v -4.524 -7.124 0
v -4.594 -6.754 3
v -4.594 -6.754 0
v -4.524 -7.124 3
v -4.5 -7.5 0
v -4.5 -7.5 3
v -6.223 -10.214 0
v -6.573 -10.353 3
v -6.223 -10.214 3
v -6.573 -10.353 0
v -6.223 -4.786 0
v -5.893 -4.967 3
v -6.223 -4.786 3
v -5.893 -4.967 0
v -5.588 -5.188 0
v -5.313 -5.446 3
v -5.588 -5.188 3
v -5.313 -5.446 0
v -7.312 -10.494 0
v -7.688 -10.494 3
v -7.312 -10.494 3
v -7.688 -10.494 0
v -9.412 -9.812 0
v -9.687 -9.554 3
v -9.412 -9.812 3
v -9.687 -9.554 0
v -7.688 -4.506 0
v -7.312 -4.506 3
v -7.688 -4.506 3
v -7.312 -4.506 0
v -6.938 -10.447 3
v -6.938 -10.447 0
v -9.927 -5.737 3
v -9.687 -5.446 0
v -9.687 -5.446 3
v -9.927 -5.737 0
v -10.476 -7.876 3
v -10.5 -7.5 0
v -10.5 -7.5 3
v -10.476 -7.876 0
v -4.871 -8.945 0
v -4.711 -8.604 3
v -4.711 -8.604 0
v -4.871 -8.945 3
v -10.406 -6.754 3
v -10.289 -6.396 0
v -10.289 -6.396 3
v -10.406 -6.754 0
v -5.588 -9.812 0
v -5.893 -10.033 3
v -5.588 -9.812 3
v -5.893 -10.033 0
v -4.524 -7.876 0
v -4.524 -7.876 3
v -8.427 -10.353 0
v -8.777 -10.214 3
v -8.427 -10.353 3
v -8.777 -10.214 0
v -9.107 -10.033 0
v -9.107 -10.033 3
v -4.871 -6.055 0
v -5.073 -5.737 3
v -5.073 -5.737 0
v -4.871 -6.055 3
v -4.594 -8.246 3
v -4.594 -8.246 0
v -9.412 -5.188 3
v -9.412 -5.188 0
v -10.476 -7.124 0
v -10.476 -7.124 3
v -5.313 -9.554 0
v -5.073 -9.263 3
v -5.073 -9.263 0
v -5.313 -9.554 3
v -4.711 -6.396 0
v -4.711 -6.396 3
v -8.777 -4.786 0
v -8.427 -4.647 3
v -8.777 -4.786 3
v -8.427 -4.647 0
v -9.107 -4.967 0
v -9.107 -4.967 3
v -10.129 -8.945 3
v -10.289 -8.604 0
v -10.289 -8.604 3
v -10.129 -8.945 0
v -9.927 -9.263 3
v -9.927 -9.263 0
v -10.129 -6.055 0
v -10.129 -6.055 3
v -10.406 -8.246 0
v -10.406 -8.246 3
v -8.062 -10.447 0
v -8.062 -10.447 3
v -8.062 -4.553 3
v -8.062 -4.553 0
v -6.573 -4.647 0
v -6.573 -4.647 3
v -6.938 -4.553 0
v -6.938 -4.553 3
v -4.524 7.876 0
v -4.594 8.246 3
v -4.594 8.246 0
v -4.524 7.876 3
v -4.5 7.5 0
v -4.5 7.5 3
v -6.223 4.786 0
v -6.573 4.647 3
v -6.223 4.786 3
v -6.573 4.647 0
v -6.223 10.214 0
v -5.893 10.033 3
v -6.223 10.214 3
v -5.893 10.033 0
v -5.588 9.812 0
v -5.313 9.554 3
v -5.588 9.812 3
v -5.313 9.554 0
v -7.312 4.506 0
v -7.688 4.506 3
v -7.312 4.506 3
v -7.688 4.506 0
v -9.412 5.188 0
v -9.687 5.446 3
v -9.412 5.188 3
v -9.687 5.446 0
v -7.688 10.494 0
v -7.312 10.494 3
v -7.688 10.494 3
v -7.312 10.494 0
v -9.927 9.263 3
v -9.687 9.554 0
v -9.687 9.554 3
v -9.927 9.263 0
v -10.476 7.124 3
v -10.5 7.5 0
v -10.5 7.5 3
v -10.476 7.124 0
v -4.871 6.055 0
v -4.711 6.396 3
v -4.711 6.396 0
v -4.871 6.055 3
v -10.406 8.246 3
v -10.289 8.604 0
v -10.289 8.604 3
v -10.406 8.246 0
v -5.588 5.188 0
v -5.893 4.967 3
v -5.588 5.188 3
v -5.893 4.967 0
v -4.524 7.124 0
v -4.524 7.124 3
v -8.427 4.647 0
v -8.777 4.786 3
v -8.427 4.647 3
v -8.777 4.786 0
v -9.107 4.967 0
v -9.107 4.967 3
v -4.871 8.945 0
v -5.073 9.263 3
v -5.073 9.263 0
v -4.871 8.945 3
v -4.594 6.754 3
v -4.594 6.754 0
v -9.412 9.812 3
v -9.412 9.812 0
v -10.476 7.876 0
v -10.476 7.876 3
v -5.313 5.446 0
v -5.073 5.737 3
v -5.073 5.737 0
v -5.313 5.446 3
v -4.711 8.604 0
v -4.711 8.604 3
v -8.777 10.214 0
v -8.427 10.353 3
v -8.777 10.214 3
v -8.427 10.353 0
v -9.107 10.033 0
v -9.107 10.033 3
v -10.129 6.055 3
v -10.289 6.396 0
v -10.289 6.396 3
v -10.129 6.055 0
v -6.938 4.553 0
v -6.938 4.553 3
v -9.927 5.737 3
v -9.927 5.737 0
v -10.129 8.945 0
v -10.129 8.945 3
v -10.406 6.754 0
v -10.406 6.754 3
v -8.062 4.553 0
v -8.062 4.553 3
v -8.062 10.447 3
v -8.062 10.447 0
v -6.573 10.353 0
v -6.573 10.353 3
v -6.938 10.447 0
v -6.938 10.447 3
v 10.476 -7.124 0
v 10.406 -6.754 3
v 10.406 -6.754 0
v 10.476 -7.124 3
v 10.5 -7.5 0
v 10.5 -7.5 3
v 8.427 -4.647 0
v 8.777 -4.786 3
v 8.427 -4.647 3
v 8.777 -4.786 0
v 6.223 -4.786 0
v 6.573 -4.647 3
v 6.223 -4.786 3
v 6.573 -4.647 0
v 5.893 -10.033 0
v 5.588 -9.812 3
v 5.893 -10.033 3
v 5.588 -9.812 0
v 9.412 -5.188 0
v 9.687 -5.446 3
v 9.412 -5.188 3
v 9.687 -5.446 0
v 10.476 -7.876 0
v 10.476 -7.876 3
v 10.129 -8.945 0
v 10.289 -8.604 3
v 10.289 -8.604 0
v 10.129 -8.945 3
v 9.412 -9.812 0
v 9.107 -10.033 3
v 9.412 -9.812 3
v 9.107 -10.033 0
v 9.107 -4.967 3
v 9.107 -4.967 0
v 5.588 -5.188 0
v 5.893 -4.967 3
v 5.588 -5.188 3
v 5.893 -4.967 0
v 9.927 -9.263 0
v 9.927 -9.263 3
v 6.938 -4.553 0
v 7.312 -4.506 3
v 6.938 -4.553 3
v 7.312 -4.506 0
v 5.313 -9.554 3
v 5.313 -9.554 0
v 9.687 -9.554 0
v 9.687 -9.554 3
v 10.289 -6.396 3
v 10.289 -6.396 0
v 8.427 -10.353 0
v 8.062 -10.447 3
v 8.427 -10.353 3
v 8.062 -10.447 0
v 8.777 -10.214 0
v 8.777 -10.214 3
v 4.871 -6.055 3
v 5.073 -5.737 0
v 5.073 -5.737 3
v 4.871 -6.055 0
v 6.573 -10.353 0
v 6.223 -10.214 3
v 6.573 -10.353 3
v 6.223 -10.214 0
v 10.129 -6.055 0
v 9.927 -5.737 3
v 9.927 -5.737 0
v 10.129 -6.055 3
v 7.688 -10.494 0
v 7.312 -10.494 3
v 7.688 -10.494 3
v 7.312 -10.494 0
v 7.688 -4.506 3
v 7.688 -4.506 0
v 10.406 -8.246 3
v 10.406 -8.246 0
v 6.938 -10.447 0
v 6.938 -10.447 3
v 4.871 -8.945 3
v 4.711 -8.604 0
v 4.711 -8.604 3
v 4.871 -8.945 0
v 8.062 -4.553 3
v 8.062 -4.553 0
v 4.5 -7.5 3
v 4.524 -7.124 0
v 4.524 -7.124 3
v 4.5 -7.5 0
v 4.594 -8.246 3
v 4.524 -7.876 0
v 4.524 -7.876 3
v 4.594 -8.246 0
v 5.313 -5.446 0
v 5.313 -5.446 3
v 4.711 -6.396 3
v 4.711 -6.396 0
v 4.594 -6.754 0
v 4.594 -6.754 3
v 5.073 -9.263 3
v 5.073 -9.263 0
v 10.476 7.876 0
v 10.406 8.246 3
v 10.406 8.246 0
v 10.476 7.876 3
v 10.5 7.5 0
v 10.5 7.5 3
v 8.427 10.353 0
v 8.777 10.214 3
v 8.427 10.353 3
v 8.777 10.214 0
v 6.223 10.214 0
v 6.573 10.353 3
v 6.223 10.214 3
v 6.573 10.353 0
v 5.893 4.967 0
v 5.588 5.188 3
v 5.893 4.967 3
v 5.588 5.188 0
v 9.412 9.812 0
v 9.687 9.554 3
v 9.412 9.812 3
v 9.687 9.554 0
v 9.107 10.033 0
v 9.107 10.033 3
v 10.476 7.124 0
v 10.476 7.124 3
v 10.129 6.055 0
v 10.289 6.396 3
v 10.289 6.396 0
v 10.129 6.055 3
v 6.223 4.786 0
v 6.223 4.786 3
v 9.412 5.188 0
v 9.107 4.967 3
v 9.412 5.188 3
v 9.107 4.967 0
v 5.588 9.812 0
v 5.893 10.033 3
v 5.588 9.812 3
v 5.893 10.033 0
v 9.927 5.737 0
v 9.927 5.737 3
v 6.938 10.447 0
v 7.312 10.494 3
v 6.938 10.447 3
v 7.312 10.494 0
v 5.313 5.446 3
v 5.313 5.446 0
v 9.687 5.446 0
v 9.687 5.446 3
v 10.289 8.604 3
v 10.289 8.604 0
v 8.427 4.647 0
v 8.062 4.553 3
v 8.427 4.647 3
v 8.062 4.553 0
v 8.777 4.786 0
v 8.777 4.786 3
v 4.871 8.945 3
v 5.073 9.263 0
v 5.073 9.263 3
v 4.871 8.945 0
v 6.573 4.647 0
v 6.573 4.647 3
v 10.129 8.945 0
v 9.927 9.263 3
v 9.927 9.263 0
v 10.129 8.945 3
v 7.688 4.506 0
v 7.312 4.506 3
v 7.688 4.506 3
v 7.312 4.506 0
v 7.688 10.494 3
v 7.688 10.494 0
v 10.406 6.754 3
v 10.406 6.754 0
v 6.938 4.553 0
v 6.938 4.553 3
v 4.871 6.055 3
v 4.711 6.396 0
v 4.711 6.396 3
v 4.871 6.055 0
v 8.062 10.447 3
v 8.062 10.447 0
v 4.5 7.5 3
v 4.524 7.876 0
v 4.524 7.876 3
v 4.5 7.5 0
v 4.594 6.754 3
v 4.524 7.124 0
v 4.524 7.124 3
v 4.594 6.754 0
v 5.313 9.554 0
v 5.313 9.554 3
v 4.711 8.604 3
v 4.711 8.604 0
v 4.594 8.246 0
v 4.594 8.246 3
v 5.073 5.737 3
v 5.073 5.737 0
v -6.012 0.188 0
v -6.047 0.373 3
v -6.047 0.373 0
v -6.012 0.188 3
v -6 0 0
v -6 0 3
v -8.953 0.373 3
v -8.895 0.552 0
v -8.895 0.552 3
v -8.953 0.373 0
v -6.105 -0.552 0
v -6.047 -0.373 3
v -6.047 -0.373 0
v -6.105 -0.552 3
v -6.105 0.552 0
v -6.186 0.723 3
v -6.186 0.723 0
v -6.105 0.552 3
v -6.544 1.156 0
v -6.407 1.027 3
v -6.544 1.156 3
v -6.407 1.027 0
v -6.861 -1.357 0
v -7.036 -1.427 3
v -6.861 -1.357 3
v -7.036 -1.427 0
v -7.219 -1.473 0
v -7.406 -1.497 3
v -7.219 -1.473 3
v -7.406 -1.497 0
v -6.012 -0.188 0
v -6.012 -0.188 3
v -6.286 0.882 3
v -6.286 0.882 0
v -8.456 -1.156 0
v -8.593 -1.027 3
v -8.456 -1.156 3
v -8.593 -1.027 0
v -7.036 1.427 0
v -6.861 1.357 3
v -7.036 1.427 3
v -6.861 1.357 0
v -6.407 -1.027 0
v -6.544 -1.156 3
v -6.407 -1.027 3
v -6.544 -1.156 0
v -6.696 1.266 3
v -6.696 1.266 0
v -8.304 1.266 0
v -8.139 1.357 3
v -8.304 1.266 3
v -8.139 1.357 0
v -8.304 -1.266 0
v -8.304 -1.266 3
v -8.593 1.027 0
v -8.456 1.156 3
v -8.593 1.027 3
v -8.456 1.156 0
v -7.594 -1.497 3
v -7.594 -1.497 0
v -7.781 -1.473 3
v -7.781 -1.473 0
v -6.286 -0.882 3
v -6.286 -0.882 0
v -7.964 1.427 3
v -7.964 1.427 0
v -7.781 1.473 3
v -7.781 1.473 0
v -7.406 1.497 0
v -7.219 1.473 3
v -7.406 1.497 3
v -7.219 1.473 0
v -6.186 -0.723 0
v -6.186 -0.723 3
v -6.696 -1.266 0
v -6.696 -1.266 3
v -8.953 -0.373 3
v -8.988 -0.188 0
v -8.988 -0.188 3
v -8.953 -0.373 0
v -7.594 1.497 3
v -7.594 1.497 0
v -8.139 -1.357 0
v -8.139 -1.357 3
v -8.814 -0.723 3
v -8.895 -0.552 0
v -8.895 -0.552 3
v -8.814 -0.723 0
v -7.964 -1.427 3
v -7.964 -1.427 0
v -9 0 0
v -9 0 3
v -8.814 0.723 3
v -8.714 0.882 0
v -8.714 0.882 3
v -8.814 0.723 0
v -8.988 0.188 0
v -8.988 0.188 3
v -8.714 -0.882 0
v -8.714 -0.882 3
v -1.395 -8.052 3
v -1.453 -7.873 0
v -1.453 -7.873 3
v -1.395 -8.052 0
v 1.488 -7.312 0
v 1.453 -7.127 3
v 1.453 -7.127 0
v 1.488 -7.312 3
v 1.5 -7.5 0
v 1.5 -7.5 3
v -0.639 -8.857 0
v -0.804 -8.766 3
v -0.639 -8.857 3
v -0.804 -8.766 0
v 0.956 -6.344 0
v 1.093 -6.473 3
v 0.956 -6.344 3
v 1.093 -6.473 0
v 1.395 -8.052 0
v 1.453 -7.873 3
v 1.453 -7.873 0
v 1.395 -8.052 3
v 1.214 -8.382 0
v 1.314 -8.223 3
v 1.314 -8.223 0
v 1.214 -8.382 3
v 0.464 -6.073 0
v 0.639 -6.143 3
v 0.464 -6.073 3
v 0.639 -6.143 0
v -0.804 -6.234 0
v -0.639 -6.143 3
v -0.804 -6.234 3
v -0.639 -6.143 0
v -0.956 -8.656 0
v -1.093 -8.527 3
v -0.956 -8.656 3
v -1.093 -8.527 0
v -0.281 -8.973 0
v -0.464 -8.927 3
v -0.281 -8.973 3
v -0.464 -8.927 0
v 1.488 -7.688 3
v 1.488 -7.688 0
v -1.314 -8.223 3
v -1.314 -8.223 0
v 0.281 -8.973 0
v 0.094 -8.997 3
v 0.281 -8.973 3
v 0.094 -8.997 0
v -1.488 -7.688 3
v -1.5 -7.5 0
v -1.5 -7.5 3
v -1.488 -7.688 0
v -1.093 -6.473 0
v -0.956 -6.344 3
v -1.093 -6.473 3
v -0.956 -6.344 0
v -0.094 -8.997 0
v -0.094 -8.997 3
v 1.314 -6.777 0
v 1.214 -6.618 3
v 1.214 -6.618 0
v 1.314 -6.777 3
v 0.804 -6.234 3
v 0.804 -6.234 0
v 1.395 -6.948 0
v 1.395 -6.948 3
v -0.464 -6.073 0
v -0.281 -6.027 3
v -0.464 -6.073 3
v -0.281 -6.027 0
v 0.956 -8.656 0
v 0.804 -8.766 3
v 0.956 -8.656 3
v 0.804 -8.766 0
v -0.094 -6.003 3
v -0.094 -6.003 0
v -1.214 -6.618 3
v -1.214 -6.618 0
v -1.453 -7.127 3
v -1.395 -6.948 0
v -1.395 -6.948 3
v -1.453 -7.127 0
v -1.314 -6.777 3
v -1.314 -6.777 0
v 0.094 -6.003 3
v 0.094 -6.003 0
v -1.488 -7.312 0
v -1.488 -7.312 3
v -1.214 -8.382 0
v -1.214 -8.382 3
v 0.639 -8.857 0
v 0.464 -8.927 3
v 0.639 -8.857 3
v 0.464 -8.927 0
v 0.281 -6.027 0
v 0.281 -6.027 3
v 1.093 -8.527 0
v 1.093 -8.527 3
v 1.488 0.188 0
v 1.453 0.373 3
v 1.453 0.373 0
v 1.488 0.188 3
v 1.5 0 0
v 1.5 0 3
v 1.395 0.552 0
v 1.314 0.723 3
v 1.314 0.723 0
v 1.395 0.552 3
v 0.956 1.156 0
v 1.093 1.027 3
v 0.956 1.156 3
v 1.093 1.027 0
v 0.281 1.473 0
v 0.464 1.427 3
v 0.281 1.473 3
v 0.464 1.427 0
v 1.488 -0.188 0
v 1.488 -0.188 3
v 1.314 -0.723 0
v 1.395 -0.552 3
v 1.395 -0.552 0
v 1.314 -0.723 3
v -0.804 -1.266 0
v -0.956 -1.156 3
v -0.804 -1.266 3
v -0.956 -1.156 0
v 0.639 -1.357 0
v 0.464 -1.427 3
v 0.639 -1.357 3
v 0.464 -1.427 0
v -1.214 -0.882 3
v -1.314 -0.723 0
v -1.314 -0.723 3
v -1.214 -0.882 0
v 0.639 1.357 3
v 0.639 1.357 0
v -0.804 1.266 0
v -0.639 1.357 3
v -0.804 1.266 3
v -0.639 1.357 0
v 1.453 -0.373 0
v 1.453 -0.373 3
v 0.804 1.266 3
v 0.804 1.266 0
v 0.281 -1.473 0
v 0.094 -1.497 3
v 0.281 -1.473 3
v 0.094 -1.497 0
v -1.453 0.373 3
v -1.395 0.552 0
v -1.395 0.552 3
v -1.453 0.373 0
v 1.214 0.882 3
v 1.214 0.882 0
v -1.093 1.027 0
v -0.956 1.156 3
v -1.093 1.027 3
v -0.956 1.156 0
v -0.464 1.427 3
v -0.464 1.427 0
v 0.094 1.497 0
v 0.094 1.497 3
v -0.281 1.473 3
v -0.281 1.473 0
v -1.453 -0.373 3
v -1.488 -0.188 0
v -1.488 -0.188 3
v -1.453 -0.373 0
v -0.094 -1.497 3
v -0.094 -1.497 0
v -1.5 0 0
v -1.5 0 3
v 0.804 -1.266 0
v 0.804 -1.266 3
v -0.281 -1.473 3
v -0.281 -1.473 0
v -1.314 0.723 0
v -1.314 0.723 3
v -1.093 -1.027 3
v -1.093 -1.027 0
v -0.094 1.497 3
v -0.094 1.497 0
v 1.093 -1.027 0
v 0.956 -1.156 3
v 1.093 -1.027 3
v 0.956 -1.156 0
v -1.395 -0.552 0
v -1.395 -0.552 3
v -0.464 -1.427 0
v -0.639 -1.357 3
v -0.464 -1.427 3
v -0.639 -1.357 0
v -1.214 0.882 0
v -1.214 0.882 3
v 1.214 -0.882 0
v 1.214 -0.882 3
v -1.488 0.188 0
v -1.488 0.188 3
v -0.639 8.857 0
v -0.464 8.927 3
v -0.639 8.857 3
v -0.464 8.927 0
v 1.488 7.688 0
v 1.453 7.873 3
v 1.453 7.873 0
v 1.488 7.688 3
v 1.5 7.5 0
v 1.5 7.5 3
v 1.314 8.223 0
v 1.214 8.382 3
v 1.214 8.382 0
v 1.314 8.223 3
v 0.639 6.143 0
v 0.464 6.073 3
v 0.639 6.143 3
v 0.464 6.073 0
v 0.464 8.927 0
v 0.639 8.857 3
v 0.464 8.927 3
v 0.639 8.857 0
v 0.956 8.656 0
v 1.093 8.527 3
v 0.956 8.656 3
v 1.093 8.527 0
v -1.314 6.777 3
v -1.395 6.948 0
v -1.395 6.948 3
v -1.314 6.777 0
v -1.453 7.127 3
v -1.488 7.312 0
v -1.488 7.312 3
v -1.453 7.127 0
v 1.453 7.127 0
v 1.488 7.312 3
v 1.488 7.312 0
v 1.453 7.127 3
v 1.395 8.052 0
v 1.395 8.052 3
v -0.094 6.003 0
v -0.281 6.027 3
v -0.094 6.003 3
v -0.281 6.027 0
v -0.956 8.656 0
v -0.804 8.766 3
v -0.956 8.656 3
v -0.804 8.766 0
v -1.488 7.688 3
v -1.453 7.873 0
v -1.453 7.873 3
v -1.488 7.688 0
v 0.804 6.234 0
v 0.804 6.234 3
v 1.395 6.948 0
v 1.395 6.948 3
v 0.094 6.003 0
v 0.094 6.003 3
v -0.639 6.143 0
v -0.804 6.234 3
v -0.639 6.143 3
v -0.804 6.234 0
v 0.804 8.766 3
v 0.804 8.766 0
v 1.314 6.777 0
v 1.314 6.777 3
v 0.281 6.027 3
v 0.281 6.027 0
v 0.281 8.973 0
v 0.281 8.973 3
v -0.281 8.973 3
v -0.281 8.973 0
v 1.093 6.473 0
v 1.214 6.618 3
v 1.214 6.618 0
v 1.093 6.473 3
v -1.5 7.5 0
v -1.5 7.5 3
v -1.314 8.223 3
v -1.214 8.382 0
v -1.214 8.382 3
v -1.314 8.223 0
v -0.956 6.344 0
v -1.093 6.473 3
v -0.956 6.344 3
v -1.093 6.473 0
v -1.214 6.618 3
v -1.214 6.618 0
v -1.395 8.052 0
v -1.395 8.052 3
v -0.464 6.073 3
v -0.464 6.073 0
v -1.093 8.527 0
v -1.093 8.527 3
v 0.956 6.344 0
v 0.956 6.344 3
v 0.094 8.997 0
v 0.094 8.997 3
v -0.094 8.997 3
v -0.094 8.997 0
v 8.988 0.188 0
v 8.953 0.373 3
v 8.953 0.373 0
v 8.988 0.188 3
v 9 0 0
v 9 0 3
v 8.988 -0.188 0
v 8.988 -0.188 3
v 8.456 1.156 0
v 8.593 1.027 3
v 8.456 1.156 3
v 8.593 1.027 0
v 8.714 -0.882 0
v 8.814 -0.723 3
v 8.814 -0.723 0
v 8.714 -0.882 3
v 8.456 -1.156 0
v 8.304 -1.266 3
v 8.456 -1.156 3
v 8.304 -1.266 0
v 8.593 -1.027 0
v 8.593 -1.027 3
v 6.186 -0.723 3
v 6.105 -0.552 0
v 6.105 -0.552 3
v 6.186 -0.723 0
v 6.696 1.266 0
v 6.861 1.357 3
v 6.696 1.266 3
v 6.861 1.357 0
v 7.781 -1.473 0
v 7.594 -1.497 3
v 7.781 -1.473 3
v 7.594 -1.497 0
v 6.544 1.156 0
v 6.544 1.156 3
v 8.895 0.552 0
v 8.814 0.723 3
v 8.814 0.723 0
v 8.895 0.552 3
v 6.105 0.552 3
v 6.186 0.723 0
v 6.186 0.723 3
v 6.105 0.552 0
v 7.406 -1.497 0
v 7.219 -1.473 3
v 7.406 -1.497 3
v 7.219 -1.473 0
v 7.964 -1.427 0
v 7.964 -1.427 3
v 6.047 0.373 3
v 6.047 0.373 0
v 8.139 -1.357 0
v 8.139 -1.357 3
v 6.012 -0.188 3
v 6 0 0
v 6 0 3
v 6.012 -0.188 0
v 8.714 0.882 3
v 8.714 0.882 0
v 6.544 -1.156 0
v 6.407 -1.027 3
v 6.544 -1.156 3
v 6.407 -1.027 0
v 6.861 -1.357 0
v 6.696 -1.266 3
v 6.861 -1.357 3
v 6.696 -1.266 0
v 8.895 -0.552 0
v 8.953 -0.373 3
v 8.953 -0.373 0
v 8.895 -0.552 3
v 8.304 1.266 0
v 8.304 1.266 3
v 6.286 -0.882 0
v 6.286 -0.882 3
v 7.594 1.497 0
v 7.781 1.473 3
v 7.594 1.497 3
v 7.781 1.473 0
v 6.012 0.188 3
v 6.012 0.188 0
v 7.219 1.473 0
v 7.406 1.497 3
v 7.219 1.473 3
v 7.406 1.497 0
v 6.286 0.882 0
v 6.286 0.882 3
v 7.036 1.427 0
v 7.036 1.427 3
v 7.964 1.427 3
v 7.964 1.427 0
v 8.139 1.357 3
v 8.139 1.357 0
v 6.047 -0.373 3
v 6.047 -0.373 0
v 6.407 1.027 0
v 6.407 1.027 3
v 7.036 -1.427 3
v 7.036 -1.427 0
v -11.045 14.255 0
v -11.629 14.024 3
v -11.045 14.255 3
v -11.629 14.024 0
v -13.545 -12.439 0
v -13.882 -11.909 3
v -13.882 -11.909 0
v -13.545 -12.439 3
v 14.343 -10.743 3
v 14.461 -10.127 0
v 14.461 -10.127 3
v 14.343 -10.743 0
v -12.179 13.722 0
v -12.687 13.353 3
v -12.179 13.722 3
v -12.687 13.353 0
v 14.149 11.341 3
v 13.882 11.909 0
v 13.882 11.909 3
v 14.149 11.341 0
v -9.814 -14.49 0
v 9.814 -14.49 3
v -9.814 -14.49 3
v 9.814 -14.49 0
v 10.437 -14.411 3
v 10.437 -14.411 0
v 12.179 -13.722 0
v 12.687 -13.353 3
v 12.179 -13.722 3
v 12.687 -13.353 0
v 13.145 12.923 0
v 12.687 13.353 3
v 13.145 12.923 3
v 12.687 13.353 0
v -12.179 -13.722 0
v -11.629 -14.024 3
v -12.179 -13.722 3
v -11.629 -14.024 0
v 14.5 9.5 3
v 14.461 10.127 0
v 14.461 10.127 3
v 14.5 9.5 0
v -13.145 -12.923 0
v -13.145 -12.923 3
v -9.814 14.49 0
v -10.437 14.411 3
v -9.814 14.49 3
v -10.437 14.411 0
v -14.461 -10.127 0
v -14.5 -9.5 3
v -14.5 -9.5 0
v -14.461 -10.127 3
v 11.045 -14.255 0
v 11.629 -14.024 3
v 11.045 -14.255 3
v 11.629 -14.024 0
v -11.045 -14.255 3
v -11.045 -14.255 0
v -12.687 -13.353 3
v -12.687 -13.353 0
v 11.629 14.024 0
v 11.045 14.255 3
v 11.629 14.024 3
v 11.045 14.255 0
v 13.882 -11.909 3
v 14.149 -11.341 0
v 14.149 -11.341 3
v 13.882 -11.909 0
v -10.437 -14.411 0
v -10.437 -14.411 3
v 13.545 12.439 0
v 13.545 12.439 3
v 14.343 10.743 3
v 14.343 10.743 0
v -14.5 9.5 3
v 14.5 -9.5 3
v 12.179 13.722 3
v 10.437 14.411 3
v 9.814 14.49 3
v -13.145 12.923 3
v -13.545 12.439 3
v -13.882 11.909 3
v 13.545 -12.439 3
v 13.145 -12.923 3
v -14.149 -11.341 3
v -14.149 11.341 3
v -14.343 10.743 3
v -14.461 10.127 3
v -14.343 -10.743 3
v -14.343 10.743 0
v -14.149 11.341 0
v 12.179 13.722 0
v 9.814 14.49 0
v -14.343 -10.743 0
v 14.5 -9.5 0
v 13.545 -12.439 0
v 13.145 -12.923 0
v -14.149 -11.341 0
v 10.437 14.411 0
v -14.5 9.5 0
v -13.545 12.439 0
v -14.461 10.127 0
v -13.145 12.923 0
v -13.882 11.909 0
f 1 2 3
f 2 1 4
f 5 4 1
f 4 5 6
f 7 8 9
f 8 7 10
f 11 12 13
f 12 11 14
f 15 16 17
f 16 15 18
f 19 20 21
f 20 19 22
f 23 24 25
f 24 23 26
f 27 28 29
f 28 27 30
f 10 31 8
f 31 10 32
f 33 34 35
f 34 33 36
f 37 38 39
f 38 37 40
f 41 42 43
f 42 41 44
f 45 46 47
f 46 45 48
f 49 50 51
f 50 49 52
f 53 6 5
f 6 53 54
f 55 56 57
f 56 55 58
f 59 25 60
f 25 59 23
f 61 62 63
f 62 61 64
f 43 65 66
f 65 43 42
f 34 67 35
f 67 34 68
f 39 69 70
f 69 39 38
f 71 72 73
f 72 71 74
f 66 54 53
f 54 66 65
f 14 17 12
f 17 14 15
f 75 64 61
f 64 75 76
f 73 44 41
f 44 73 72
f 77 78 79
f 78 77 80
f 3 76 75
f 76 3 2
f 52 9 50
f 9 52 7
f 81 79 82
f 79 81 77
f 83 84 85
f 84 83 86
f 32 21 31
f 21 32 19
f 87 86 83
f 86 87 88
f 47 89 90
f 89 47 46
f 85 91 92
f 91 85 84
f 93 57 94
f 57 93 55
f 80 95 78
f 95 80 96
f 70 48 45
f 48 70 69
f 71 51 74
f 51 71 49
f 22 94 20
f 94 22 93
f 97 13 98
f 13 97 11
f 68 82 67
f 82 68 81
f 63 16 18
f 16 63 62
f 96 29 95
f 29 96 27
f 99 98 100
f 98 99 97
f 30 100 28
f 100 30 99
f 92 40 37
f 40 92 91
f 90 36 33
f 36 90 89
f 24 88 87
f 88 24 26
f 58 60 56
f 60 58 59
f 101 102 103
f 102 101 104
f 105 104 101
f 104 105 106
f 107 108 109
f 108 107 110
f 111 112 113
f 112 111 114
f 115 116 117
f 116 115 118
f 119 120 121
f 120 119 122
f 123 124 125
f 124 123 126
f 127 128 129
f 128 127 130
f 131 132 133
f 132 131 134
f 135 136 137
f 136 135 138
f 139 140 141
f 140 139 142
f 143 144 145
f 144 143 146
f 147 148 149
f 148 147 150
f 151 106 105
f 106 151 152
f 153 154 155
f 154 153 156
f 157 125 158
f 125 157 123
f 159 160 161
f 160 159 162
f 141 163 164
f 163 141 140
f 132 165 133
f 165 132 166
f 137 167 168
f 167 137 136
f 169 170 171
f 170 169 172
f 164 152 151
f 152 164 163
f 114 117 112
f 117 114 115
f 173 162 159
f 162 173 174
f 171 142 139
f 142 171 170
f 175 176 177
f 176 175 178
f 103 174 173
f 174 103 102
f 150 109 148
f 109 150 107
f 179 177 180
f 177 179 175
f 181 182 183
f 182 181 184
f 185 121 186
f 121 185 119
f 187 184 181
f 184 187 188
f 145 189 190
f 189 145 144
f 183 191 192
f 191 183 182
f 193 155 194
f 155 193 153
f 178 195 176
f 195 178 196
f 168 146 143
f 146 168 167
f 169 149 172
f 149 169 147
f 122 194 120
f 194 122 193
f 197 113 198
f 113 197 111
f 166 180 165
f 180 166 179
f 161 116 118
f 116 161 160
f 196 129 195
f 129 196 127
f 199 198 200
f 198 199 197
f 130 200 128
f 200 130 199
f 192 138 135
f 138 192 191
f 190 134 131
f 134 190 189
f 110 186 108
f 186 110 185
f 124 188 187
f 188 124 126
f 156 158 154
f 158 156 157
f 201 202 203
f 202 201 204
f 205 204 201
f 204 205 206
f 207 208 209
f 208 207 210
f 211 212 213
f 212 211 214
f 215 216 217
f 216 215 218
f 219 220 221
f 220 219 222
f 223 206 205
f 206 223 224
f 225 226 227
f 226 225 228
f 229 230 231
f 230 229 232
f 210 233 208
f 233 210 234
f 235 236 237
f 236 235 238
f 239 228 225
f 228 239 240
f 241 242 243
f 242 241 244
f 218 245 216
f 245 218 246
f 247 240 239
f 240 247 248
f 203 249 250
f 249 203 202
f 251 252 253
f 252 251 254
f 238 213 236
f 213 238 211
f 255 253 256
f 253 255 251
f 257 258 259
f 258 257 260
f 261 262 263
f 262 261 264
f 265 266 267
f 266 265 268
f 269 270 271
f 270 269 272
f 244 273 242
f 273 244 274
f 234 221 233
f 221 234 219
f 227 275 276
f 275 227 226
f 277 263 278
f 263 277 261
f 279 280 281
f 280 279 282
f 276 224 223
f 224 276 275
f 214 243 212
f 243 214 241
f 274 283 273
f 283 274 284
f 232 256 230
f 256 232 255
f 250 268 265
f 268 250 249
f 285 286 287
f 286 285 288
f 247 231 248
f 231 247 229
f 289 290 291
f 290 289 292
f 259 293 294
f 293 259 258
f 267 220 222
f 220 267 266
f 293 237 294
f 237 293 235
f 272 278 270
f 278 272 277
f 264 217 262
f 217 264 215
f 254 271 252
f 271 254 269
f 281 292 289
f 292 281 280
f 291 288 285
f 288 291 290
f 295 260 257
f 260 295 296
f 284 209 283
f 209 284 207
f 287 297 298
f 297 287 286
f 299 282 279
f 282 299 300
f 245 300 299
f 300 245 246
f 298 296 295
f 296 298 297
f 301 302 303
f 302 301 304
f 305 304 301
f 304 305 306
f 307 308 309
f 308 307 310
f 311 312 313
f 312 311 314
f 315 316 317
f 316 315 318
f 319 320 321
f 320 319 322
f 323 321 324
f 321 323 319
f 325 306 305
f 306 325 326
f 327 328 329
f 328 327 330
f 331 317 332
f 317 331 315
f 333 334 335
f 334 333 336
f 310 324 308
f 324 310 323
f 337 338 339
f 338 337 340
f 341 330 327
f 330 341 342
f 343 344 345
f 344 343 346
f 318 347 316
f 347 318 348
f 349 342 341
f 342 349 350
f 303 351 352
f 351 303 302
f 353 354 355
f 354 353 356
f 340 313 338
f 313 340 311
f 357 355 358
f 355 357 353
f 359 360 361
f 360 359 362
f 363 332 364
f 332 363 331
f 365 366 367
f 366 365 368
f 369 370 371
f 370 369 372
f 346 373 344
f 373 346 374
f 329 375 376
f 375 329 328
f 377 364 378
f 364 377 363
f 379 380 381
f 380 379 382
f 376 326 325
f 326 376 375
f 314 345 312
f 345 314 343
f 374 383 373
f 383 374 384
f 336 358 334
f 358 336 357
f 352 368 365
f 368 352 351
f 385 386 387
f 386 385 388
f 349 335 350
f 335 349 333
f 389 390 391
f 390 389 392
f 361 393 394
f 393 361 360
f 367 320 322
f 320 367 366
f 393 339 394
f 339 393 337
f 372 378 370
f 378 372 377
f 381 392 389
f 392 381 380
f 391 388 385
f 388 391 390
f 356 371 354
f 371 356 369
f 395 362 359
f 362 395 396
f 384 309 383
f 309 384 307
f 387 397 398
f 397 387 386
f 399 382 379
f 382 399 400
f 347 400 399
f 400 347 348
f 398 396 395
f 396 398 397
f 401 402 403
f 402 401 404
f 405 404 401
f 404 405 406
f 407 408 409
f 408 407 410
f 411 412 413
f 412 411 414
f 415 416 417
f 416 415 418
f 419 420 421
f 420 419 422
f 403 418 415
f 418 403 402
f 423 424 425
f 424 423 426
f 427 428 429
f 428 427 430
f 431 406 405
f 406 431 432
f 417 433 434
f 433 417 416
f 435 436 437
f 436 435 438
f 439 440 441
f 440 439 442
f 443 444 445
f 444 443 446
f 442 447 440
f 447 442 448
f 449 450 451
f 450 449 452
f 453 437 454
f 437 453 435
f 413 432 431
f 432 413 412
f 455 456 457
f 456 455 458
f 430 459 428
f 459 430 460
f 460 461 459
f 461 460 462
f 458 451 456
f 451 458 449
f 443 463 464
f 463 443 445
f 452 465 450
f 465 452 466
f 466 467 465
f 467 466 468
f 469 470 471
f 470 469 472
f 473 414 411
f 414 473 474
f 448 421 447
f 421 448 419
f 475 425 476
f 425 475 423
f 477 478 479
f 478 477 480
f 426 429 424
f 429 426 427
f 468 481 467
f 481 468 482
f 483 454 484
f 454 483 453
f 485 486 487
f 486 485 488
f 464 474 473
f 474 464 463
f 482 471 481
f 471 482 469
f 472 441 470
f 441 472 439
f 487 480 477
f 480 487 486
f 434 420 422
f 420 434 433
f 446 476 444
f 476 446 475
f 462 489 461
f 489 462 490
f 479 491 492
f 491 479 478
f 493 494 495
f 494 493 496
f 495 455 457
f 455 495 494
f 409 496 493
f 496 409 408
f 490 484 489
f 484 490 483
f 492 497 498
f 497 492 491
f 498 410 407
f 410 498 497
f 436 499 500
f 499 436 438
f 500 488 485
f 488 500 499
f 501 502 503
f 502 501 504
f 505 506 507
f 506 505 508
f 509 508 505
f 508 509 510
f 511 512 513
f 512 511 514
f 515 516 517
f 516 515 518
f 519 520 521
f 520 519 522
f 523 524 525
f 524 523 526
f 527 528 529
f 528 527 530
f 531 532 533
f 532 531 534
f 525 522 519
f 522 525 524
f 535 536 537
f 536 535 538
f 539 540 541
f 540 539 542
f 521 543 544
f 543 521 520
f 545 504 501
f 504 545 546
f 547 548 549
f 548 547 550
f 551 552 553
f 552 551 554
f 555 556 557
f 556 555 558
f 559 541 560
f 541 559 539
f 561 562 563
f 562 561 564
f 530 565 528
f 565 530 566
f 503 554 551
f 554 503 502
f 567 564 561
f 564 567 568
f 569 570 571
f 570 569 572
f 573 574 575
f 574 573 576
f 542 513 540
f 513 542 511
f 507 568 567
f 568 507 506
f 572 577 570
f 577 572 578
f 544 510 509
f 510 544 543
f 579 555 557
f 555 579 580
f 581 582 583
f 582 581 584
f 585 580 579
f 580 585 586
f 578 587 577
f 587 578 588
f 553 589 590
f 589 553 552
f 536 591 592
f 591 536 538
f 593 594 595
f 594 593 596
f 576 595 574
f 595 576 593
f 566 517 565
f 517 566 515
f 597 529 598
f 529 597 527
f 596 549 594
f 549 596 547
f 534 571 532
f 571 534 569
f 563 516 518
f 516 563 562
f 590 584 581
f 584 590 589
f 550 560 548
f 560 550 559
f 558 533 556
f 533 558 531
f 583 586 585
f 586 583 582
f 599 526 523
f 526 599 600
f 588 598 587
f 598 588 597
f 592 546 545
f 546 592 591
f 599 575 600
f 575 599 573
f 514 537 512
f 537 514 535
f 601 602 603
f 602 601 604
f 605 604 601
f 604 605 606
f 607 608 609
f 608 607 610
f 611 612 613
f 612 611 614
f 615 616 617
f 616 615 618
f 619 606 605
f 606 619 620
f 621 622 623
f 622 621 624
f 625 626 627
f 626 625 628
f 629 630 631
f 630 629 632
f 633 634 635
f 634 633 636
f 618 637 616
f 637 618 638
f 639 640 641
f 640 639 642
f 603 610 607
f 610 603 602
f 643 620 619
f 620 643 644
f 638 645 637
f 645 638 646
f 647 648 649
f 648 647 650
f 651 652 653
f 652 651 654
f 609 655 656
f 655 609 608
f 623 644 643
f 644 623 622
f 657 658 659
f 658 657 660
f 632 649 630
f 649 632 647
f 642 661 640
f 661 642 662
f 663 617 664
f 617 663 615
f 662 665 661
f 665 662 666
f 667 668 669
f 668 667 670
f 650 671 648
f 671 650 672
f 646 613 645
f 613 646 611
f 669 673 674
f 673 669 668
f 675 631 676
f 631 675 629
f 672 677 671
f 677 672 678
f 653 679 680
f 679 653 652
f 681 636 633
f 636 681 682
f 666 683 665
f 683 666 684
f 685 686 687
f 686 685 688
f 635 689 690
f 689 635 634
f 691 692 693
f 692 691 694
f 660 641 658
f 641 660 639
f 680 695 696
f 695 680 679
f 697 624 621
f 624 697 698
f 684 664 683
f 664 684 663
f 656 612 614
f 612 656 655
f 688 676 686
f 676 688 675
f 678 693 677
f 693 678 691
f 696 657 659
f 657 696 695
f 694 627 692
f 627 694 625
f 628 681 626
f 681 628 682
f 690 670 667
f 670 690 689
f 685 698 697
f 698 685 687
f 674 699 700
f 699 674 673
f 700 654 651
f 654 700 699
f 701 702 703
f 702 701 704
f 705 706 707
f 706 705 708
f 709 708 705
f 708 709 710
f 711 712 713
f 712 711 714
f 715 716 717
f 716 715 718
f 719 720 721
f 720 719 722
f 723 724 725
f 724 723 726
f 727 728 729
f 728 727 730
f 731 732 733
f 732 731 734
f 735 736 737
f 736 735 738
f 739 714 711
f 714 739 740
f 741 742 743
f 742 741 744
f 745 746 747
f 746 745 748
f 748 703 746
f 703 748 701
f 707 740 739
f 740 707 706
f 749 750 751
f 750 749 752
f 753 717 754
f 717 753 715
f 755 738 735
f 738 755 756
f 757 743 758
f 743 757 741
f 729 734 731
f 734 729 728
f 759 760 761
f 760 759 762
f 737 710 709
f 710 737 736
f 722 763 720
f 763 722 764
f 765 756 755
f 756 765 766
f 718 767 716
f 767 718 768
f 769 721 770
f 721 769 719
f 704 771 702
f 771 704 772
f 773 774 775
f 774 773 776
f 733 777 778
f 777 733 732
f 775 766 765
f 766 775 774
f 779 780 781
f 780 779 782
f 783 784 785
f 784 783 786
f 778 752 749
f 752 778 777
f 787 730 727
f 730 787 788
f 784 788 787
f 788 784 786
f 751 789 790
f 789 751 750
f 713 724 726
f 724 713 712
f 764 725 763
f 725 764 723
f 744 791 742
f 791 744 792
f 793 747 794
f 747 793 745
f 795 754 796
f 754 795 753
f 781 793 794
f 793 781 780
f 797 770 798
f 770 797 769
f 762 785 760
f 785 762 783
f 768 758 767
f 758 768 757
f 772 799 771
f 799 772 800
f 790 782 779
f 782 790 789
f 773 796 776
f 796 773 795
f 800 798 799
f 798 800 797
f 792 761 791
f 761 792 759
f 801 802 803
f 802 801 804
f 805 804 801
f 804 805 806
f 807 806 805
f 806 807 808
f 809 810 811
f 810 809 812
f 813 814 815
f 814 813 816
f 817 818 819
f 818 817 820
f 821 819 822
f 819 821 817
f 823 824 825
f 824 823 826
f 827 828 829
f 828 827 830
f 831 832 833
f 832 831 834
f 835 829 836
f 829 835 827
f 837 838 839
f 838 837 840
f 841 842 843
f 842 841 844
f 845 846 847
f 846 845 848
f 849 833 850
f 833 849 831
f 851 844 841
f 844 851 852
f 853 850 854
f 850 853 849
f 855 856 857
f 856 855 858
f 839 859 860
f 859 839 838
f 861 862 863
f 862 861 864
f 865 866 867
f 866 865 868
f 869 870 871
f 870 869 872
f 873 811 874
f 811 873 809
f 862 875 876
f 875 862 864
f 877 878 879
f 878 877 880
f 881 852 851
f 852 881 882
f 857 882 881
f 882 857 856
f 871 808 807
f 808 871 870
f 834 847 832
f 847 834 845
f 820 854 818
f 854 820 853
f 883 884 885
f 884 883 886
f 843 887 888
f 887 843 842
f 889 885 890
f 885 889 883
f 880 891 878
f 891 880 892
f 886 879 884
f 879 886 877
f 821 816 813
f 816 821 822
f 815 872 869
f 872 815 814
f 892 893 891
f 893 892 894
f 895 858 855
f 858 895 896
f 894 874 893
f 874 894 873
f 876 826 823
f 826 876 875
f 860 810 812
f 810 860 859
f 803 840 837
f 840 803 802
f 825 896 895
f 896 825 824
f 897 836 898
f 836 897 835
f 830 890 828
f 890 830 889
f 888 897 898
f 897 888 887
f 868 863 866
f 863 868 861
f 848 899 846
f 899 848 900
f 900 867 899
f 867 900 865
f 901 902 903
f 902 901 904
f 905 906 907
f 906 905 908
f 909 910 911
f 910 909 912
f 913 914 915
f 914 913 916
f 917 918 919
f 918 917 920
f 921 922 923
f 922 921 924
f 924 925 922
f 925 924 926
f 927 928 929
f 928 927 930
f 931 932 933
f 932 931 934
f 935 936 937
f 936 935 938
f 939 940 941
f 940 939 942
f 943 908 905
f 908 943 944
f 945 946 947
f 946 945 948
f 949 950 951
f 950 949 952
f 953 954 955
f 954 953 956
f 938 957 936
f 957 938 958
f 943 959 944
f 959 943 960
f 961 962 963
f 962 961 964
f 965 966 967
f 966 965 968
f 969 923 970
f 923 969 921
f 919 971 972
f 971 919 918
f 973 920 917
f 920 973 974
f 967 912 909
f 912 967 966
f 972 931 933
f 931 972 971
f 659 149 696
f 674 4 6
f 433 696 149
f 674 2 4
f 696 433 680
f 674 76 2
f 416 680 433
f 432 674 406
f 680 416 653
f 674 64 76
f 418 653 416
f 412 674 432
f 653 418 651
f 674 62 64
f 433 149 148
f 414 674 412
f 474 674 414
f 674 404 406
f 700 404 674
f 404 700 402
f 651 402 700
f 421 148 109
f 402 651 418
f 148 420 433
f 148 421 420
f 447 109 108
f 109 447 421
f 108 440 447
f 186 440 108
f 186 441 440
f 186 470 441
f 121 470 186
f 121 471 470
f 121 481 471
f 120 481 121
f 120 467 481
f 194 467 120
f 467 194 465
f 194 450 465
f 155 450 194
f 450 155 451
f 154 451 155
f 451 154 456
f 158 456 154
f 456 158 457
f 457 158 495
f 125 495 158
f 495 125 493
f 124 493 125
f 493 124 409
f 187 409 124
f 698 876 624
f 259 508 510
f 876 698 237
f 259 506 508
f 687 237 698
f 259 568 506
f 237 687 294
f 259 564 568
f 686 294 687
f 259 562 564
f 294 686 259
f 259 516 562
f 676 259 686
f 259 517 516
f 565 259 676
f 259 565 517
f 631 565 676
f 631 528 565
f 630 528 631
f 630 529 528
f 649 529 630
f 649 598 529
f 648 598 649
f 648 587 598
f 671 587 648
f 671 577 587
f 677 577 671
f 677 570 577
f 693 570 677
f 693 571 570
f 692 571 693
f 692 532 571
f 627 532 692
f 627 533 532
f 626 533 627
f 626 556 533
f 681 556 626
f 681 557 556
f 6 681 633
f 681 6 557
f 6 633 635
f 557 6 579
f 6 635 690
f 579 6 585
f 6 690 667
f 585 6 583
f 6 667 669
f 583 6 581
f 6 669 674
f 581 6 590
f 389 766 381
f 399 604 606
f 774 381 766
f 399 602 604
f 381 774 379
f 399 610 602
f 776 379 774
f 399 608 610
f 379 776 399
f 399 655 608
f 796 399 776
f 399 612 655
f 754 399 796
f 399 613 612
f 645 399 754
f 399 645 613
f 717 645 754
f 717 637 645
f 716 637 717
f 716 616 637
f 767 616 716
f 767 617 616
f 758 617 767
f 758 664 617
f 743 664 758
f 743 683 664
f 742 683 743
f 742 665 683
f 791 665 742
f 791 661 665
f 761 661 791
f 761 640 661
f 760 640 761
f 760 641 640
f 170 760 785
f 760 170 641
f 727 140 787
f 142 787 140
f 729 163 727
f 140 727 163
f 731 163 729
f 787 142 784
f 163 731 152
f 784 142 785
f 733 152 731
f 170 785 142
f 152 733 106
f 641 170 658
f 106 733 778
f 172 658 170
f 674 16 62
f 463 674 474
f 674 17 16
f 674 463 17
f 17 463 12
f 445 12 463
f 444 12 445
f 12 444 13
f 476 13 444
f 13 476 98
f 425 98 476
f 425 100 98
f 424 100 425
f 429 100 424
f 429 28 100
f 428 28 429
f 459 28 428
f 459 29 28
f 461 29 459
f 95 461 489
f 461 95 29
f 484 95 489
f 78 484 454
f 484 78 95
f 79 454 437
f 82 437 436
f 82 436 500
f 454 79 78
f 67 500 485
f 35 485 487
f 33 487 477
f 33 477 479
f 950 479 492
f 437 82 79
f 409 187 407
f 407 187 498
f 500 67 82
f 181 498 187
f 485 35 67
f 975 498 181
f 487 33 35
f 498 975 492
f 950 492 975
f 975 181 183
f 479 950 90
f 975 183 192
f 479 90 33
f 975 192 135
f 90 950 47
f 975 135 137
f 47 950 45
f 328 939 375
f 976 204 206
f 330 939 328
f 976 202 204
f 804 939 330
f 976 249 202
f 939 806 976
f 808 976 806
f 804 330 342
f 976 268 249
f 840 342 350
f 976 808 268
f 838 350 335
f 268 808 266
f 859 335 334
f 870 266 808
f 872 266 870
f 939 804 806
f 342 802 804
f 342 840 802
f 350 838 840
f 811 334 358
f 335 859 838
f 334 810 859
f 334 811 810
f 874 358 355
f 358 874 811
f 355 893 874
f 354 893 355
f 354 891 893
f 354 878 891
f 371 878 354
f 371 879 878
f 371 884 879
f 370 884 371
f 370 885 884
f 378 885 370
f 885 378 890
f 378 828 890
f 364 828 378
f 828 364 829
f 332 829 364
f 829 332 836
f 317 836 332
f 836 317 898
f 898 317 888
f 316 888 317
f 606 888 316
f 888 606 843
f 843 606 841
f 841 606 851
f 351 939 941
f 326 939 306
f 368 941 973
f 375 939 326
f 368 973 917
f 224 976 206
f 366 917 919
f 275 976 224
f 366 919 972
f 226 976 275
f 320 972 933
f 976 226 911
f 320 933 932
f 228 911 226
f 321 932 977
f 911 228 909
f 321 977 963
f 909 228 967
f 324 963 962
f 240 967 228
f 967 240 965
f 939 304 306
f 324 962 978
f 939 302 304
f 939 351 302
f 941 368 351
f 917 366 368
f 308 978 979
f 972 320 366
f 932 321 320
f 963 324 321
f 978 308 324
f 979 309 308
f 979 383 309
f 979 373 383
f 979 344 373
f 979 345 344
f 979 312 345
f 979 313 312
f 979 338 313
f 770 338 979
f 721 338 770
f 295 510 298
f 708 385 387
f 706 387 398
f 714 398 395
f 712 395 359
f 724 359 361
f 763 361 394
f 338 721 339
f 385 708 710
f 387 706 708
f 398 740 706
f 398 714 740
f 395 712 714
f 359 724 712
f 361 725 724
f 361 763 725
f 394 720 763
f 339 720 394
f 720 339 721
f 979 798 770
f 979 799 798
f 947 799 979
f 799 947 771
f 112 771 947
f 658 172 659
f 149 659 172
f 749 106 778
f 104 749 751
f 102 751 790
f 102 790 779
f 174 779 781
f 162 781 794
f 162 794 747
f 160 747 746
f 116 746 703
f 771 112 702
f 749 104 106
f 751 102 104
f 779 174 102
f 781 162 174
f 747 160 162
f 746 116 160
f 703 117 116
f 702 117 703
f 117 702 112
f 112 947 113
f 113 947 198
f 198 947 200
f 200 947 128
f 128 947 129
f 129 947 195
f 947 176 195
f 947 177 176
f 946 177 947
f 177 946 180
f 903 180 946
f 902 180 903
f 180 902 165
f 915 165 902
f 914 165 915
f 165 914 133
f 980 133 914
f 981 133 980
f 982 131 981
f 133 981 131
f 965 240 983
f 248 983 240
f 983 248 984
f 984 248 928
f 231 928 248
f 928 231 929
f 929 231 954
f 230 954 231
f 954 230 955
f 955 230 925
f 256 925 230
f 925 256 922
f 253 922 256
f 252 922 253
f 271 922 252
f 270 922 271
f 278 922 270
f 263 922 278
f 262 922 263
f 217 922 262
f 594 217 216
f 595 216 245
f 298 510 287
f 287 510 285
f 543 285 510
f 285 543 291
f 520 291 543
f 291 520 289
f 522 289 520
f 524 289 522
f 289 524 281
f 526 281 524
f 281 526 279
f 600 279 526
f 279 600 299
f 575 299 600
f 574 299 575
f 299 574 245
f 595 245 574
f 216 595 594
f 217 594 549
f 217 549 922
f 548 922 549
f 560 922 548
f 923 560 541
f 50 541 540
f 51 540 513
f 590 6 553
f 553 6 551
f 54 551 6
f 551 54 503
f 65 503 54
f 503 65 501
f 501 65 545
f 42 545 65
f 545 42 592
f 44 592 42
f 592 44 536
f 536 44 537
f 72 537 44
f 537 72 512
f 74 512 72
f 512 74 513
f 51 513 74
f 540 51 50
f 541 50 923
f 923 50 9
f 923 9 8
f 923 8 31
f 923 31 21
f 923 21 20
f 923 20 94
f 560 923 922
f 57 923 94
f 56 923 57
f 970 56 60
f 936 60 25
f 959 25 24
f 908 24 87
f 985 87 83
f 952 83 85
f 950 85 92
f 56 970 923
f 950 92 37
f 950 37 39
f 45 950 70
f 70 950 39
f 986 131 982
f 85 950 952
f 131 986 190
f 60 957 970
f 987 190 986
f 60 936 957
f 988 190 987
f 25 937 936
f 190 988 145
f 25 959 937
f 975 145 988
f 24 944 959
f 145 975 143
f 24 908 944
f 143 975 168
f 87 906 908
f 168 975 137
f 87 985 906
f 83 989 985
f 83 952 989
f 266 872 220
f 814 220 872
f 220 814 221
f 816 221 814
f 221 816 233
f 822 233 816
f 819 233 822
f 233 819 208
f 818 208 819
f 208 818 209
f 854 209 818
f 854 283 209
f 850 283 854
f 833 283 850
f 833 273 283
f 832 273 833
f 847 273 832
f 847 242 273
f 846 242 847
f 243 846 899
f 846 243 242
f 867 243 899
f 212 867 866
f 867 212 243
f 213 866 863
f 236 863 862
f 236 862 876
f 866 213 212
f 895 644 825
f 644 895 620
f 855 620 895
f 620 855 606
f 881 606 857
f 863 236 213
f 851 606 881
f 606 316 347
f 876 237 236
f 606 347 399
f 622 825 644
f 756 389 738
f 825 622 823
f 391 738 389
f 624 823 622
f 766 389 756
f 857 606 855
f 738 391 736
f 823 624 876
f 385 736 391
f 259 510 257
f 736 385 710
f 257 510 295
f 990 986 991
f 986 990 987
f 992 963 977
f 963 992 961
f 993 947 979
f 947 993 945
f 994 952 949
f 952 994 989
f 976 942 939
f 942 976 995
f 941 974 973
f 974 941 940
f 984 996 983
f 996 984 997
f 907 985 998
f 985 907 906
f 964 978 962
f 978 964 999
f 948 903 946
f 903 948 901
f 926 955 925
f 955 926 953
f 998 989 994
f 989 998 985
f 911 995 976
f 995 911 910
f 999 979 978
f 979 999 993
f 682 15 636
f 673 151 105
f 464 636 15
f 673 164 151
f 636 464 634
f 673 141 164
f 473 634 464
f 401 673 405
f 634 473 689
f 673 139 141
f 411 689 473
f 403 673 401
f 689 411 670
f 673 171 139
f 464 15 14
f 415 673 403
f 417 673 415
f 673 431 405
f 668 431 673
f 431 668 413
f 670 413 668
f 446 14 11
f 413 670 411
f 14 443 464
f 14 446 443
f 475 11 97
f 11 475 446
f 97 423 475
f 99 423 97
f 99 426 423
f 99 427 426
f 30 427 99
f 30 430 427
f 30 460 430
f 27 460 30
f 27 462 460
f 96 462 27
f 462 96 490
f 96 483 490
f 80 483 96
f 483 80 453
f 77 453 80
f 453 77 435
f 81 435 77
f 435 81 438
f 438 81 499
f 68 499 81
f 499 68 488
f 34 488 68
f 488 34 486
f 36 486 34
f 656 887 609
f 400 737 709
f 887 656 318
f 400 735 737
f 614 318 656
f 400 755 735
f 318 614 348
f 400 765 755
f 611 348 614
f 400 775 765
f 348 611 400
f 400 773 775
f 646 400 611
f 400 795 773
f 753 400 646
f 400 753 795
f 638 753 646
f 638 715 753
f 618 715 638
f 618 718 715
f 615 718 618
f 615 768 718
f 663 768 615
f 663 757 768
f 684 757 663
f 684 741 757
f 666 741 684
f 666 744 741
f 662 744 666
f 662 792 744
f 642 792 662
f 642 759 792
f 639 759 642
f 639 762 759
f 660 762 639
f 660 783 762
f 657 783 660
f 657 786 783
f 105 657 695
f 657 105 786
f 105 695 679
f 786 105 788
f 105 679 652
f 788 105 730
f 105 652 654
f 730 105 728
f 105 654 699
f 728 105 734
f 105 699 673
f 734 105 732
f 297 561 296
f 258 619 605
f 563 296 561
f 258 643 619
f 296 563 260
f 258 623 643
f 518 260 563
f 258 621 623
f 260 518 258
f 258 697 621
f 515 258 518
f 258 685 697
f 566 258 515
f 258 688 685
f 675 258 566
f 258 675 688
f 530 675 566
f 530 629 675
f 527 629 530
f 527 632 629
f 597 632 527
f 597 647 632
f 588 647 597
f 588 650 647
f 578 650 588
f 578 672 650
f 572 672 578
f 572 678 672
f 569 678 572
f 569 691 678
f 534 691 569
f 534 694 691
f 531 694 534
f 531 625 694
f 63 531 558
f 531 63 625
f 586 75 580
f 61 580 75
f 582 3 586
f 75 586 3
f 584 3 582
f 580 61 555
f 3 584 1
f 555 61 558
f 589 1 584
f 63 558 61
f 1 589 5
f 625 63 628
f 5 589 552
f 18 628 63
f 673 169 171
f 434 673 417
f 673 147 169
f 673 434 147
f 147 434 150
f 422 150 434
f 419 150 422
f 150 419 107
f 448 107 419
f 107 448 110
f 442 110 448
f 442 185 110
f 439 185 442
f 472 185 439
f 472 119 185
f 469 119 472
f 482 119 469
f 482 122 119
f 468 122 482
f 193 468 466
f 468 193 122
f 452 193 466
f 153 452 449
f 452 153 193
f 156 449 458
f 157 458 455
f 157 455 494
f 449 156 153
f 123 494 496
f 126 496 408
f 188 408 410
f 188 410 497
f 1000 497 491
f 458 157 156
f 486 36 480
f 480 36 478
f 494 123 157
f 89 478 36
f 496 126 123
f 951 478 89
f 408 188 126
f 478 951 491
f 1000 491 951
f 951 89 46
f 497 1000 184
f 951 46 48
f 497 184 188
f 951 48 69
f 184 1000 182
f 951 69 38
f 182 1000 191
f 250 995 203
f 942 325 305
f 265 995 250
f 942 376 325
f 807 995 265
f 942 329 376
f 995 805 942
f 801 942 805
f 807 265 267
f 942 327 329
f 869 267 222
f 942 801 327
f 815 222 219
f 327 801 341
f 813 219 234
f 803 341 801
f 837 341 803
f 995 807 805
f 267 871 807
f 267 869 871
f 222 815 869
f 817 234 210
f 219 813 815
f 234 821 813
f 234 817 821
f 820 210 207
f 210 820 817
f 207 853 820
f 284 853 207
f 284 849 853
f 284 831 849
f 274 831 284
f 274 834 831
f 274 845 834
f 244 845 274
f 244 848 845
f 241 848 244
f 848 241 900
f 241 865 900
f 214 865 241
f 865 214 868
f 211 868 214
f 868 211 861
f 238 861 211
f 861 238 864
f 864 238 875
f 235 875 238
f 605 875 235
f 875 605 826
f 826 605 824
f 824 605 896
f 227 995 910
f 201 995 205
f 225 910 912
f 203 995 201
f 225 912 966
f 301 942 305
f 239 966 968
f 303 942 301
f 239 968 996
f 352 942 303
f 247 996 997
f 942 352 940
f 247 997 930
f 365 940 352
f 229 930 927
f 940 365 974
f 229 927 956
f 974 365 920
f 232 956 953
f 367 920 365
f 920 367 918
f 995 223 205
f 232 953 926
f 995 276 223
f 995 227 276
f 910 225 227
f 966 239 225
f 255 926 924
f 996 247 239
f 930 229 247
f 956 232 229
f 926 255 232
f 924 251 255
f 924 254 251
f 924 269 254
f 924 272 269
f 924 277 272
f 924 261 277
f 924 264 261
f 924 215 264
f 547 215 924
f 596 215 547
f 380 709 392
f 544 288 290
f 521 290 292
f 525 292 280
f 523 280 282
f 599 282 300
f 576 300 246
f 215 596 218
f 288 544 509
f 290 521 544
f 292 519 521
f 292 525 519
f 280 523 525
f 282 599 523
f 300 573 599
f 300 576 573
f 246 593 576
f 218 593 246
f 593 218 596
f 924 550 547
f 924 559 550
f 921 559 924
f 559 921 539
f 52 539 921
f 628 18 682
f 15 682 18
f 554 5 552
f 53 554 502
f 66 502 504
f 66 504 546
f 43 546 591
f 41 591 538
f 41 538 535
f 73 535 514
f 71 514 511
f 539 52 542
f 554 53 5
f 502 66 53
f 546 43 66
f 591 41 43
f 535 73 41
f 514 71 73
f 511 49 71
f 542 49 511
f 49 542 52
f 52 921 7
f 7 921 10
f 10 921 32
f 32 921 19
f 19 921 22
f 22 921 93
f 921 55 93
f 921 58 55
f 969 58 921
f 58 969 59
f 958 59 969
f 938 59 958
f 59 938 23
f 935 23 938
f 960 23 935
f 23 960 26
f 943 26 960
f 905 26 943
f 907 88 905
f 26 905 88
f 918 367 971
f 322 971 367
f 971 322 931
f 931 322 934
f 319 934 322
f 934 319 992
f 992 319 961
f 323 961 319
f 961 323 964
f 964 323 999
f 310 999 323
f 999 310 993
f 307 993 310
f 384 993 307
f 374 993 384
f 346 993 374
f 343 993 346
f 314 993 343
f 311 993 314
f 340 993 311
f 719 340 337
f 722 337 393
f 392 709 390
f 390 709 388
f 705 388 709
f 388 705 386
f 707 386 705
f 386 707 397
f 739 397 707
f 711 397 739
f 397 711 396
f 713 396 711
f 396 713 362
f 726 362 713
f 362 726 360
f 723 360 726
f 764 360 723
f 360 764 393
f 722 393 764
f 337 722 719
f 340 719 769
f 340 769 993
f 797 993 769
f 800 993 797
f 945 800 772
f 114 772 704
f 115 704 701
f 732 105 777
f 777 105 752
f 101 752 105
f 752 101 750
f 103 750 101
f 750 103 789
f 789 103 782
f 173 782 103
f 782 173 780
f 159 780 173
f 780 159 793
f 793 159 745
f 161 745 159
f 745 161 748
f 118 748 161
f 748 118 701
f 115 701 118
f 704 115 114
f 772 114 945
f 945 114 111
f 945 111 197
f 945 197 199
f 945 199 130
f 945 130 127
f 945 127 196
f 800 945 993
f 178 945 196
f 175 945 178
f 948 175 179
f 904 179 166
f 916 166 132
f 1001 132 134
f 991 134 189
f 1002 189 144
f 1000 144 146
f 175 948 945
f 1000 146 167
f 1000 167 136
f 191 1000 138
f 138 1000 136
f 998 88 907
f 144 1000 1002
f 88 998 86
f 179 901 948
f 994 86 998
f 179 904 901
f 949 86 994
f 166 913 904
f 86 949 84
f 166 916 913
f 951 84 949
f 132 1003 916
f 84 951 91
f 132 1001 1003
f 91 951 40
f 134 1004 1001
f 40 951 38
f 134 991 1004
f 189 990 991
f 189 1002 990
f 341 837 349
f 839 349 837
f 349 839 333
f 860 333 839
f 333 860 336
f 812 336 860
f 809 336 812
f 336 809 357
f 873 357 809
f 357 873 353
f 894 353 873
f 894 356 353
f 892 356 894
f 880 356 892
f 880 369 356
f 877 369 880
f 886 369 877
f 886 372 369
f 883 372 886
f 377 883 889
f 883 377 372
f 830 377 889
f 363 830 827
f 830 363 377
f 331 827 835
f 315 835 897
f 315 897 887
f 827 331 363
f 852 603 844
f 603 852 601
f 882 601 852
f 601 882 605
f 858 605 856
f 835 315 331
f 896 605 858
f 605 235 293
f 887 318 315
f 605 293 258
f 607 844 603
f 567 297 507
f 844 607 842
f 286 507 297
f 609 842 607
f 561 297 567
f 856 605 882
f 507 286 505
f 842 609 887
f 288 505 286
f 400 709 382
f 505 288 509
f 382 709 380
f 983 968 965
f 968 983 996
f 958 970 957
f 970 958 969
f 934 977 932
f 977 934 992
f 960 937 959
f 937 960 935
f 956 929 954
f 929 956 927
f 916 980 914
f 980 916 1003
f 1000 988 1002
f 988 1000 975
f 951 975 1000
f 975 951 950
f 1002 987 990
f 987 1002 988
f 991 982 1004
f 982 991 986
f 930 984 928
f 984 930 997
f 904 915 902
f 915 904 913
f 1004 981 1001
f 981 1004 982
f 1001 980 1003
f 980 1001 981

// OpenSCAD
$fn = 50;

difference() {
	union() {
		hull() {
			translate(v = [-9.5, 9.5, 0]) {
				cylinder(h = 3, r = 5);
			}
			translate(v = [9.5, 9.5, 0]) {
				cylinder(h = 3, r = 5);
			}
			translate(v = [-9.5, -9.5, 0]) {
				cylinder(h = 3, r = 5);
			}
			translate(v = [9.5, -9.5, 0]) {
				cylinder(h = 3, r = 5);
			}
		}
	}
	union() {
		translate(v = [-7.5, -7.5, 0]) {
			translate(v = [0, 0, -100]) {
				cylinder(h = 200, r = 3.0);
			}
		}
		translate(v = [-7.5, 7.5, 0]) {
			translate(v = [0, 0, -100]) {
				cylinder(h = 200, r = 3.0);
			}
		}
		translate(v = [7.5, -7.5, 0]) {
			translate(v = [0, 0, -100]) {
				cylinder(h = 200, r = 3.0);
			}
		}
		translate(v = [7.5, 7.5, 0]) {
			translate(v = [0, 0, -100]) {
				cylinder(h = 200, r = 3.0);
			}
		}
		translate(v = [-7.5, -7.5, 0]) {
			translate(v = [0, 0, -100]) {
				cylinder(h = 200, r = 1.5);
			}
		}
		translate(v = [-7.5, 0.0, 0]) {
			translate(v = [0, 0, -100]) {
				cylinder(h = 200, r = 1.5);
			}
		}
		translate(v = [-7.5, 7.5, 0]) {
			translate(v = [0, 0, -100]) {
				cylinder(h = 200, r = 1.5);
			}
		}
		translate(v = [0.0, -7.5, 0]) {
			translate(v = [0, 0, -100]) {
				cylinder(h = 200, r = 1.5);
			}
		}
		translate(v = [0, 0, -100]) {
			cylinder(h = 200, r = 1.5);
		}
		translate(v = [0.0, 7.5, 0]) {
			translate(v = [0, 0, -100]) {
				cylinder(h = 200, r = 1.5);
			}
		}
		translate(v = [7.5, -7.5, 0]) {
			translate(v = [0, 0, -100]) {
				cylinder(h = 200, r = 1.5);
			}
		}
		translate(v = [7.5, 0.0, 0]) {
			translate(v = [0, 0, -100]) {
				cylinder(h = 200, r = 1.5);
			}
		}
		translate(v = [7.5, 7.5, 0]) {
			translate(v = [0, 0, -100]) {
				cylinder(h = 200, r = 1.5);
			}
		}
	}
}
